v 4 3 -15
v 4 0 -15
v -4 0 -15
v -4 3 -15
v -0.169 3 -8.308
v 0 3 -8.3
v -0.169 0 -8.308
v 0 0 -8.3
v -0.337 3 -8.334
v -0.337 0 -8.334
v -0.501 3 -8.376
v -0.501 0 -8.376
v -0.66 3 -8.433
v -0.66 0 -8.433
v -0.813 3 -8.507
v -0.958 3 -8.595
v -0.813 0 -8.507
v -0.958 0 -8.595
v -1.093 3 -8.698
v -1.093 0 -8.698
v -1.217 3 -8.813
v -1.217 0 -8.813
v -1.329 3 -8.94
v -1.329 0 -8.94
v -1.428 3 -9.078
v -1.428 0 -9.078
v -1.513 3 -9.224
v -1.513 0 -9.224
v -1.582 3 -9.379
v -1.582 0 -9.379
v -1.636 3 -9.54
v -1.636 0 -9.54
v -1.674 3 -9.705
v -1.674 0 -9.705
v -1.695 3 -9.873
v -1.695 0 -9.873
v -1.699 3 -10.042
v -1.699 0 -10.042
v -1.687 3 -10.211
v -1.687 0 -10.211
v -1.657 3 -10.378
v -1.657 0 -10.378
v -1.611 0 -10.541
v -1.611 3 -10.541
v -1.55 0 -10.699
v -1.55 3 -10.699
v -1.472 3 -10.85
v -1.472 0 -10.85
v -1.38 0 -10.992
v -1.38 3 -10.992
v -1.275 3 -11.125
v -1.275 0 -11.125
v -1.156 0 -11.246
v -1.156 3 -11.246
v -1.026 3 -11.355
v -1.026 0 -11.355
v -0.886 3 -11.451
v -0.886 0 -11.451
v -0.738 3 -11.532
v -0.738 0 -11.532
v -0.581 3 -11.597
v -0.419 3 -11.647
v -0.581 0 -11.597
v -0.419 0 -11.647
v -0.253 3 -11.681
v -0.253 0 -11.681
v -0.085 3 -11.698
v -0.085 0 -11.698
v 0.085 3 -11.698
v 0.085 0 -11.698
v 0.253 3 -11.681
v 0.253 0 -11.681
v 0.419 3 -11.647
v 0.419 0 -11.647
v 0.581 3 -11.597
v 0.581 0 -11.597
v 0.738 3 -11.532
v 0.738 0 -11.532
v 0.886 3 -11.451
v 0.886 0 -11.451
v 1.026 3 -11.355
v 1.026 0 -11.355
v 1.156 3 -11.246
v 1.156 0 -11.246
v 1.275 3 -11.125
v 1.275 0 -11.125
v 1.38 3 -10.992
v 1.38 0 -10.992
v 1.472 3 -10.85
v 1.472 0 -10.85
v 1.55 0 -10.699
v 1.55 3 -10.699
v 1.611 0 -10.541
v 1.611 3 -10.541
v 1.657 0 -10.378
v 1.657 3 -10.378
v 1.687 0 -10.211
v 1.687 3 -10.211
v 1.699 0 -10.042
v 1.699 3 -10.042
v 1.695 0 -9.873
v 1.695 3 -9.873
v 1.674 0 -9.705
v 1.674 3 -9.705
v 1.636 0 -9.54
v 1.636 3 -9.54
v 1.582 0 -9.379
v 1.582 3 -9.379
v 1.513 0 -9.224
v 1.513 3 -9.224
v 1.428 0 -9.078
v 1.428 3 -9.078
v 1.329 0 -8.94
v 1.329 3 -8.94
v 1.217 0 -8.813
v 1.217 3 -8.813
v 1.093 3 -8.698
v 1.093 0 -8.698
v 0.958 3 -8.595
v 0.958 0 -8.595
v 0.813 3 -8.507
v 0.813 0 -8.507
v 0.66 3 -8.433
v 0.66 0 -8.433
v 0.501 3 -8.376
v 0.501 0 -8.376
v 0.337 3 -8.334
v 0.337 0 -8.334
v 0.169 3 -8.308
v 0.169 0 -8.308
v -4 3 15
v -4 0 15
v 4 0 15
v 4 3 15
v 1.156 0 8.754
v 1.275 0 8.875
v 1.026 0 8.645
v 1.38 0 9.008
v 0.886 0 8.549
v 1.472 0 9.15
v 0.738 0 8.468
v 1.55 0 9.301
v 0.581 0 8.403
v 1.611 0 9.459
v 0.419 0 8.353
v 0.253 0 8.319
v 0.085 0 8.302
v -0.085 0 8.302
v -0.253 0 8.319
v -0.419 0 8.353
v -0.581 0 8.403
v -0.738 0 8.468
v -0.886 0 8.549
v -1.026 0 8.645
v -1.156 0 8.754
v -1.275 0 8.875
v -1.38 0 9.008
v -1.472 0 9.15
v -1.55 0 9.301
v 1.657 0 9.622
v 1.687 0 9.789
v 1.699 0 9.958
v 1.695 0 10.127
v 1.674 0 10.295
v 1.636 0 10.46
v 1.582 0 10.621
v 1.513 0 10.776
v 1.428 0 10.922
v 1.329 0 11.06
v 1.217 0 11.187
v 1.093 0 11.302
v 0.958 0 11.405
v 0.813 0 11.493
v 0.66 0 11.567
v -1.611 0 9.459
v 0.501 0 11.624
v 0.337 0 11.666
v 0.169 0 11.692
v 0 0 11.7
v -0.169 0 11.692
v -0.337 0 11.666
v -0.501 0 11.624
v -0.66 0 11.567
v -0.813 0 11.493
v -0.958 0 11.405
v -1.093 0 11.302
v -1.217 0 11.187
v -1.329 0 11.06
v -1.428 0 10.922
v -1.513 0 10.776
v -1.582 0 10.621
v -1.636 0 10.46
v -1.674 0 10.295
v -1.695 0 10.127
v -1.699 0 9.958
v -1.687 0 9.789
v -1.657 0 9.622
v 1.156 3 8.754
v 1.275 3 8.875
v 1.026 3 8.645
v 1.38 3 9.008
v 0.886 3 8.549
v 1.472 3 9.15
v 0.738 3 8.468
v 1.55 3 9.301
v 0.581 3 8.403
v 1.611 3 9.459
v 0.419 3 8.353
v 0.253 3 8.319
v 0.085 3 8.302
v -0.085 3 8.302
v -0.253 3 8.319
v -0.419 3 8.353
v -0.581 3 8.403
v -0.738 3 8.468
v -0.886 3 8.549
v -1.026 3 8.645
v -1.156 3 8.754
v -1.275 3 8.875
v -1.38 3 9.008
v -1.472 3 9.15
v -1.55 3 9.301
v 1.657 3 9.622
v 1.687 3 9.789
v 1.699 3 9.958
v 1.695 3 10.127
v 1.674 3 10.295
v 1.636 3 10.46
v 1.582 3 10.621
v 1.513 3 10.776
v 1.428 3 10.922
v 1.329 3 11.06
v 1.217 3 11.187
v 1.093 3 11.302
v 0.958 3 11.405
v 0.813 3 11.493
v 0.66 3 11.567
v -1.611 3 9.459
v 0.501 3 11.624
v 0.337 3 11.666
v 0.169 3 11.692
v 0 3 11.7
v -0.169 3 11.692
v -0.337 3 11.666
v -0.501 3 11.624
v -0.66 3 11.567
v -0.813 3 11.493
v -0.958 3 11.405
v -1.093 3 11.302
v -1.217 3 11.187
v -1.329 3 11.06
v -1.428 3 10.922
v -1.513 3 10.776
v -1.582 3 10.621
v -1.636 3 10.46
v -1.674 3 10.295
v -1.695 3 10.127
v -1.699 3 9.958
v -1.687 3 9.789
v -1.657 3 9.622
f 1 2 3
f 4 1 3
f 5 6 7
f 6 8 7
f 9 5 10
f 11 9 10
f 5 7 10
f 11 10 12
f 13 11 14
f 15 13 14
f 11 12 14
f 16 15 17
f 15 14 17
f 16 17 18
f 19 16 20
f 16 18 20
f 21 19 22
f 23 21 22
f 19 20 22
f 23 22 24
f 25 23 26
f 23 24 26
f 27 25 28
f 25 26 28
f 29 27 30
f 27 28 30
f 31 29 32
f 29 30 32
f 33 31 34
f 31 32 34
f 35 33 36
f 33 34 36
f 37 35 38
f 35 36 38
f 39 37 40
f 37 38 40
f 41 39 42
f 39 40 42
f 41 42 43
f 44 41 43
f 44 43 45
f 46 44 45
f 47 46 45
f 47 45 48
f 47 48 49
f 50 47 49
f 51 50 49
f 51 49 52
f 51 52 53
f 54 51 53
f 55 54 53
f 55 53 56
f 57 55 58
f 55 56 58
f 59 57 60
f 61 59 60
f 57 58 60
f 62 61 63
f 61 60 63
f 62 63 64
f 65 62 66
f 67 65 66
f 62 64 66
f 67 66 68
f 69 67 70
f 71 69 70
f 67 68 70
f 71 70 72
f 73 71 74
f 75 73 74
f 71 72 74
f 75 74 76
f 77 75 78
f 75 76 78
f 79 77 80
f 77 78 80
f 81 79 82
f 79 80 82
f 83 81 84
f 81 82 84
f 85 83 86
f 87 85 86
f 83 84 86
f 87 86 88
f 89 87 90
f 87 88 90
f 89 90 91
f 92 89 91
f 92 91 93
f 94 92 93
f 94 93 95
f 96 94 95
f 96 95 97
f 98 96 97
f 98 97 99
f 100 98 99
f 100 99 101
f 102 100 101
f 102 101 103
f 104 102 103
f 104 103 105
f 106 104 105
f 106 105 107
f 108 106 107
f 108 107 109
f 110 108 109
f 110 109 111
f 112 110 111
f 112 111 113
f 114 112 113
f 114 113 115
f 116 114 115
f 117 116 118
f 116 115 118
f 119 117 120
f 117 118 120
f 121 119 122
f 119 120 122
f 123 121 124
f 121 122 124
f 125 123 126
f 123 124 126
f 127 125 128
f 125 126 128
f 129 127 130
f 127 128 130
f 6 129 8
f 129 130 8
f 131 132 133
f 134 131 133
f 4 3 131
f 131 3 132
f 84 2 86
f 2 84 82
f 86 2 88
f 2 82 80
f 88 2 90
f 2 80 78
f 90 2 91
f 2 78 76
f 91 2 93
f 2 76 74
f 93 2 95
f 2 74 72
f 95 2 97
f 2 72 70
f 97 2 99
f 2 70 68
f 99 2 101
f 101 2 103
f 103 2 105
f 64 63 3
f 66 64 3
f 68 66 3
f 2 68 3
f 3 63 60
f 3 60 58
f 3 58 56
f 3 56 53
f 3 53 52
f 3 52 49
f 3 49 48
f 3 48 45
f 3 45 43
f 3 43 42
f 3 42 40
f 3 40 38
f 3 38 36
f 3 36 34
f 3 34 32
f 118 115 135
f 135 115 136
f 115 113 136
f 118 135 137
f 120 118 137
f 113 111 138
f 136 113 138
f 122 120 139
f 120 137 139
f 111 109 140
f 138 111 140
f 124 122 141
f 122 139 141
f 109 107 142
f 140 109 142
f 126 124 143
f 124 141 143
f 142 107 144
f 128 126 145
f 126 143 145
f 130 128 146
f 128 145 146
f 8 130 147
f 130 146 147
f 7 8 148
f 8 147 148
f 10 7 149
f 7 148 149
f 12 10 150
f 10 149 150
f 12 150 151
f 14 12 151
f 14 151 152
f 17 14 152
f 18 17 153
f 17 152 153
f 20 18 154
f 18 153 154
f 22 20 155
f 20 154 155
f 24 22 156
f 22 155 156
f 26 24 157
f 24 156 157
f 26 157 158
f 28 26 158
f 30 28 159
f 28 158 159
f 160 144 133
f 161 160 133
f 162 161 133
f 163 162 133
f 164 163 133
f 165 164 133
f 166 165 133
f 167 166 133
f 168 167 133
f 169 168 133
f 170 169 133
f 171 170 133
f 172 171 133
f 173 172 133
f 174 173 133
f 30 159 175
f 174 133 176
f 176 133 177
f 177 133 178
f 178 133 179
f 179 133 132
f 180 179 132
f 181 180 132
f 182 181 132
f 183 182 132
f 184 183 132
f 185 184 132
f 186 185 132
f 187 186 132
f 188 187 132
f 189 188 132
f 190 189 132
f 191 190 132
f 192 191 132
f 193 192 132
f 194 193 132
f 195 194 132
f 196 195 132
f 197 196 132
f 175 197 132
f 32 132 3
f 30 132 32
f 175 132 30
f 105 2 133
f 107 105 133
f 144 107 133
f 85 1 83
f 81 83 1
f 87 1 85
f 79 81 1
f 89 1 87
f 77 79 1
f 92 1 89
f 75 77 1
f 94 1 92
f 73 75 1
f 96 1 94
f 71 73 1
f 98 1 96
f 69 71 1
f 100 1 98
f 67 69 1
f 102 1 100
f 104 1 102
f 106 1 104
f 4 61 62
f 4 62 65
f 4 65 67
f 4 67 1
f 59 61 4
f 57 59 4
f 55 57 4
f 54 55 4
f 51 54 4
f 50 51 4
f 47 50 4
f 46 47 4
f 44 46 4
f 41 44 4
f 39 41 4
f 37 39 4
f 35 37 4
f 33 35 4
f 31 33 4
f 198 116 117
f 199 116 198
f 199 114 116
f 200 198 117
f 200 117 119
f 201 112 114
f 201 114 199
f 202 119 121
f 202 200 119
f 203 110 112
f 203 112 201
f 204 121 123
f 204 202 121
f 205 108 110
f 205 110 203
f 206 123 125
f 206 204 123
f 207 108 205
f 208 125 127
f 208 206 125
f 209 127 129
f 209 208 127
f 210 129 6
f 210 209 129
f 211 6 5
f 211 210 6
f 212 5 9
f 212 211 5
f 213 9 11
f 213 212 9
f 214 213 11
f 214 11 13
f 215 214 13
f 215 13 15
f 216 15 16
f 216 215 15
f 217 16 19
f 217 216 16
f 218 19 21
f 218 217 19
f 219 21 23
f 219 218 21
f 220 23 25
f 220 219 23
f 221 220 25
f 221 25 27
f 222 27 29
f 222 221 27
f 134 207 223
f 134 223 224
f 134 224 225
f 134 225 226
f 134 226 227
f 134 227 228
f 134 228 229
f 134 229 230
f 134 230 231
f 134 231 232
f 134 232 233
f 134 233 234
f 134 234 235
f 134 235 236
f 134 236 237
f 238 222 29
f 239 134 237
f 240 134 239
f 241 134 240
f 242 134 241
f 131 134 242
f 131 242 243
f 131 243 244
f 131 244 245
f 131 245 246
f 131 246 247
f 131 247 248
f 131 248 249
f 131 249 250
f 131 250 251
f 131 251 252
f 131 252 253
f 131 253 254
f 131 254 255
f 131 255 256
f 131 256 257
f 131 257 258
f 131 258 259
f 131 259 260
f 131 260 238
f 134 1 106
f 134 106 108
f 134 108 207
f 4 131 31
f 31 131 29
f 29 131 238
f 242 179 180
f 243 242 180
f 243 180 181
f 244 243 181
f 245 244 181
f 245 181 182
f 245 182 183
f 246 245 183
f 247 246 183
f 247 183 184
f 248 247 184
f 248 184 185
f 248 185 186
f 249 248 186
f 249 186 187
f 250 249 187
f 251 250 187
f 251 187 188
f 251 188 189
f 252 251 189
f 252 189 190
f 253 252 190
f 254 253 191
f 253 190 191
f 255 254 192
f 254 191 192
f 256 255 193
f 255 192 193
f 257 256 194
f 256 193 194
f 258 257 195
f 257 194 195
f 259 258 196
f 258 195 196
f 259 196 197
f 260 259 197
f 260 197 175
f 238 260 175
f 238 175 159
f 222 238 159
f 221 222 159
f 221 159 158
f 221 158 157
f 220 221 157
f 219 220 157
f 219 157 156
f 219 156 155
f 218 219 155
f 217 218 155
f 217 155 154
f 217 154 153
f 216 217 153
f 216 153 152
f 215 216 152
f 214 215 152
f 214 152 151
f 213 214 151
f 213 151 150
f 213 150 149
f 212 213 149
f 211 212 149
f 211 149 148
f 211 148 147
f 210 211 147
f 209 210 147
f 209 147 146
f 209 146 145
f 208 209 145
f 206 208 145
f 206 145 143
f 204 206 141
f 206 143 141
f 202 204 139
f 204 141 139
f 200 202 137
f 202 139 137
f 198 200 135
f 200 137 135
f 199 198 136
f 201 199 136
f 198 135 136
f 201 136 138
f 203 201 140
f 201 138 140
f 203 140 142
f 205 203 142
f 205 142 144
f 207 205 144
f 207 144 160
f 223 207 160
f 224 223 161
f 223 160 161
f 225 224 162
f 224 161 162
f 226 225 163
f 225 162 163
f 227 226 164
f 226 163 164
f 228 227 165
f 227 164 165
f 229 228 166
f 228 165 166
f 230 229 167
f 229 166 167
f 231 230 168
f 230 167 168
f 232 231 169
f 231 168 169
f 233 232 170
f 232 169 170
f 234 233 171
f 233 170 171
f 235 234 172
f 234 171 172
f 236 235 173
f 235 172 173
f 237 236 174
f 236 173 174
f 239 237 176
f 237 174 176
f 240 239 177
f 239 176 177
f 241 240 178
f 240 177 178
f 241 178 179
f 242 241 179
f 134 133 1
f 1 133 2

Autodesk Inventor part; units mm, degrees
ref_plane "YZ Plane" through (0, 0, 0) normal (1, 0, 0) x (0, 1, 0)
ref_plane "XZ Plane" through (0, 0, 0) normal (0, 1, 0) x (-1, 0, 0)
ref_plane "XY Plane" through (0, 0, 0) normal (0, 0, 1) x (1, 0, 0)
sketch "Sketch1" plane through (0, 0, 0) normal (0, 1, 0) x (-1, 0, 0)
  line L0 (-4, -15) -> (4, -15)
  line L1 (4, -15) -> (4, 15)
  line L2 (4, 15) -> (-4, 15)
  line L3 (-4, 15) -> (-4, -15)
  line L4 (-4, -15) -> (4, 15) construction
  line L5 (4, -15) -> (-4, 15) construction
  point P0 (0, 0)
  dimension "d0" = 8
  dimension "d1" = 30
extrude "Extrusion1" add sketch "Sketch1" along normal blind 3
sketch "Sketch3" plane through (0, 3, 0) normal (0, 1, 0) x (1, 0, 0)
  line L0 (-4, -15) -> (4, -15) projected
  line L1 (0, -15) -> (0, 15) construction
  line L2 (4, 15) -> (-4, 15) projected
  point P0 (0, 0)
  point P1 (0, -10)
  point P2 (0, 10)
  dimension "d8" = 5
  dimension "d9" = 5
hole "Hole1" at (0, 3, 10) at (0, 3, -10) direction (0, -1, 0) diameter 3.4 end through all clearance for "Socket Head Cap Screw ISO 4762" size "M3" standard "ISO"
properties part number "turning clip top"
